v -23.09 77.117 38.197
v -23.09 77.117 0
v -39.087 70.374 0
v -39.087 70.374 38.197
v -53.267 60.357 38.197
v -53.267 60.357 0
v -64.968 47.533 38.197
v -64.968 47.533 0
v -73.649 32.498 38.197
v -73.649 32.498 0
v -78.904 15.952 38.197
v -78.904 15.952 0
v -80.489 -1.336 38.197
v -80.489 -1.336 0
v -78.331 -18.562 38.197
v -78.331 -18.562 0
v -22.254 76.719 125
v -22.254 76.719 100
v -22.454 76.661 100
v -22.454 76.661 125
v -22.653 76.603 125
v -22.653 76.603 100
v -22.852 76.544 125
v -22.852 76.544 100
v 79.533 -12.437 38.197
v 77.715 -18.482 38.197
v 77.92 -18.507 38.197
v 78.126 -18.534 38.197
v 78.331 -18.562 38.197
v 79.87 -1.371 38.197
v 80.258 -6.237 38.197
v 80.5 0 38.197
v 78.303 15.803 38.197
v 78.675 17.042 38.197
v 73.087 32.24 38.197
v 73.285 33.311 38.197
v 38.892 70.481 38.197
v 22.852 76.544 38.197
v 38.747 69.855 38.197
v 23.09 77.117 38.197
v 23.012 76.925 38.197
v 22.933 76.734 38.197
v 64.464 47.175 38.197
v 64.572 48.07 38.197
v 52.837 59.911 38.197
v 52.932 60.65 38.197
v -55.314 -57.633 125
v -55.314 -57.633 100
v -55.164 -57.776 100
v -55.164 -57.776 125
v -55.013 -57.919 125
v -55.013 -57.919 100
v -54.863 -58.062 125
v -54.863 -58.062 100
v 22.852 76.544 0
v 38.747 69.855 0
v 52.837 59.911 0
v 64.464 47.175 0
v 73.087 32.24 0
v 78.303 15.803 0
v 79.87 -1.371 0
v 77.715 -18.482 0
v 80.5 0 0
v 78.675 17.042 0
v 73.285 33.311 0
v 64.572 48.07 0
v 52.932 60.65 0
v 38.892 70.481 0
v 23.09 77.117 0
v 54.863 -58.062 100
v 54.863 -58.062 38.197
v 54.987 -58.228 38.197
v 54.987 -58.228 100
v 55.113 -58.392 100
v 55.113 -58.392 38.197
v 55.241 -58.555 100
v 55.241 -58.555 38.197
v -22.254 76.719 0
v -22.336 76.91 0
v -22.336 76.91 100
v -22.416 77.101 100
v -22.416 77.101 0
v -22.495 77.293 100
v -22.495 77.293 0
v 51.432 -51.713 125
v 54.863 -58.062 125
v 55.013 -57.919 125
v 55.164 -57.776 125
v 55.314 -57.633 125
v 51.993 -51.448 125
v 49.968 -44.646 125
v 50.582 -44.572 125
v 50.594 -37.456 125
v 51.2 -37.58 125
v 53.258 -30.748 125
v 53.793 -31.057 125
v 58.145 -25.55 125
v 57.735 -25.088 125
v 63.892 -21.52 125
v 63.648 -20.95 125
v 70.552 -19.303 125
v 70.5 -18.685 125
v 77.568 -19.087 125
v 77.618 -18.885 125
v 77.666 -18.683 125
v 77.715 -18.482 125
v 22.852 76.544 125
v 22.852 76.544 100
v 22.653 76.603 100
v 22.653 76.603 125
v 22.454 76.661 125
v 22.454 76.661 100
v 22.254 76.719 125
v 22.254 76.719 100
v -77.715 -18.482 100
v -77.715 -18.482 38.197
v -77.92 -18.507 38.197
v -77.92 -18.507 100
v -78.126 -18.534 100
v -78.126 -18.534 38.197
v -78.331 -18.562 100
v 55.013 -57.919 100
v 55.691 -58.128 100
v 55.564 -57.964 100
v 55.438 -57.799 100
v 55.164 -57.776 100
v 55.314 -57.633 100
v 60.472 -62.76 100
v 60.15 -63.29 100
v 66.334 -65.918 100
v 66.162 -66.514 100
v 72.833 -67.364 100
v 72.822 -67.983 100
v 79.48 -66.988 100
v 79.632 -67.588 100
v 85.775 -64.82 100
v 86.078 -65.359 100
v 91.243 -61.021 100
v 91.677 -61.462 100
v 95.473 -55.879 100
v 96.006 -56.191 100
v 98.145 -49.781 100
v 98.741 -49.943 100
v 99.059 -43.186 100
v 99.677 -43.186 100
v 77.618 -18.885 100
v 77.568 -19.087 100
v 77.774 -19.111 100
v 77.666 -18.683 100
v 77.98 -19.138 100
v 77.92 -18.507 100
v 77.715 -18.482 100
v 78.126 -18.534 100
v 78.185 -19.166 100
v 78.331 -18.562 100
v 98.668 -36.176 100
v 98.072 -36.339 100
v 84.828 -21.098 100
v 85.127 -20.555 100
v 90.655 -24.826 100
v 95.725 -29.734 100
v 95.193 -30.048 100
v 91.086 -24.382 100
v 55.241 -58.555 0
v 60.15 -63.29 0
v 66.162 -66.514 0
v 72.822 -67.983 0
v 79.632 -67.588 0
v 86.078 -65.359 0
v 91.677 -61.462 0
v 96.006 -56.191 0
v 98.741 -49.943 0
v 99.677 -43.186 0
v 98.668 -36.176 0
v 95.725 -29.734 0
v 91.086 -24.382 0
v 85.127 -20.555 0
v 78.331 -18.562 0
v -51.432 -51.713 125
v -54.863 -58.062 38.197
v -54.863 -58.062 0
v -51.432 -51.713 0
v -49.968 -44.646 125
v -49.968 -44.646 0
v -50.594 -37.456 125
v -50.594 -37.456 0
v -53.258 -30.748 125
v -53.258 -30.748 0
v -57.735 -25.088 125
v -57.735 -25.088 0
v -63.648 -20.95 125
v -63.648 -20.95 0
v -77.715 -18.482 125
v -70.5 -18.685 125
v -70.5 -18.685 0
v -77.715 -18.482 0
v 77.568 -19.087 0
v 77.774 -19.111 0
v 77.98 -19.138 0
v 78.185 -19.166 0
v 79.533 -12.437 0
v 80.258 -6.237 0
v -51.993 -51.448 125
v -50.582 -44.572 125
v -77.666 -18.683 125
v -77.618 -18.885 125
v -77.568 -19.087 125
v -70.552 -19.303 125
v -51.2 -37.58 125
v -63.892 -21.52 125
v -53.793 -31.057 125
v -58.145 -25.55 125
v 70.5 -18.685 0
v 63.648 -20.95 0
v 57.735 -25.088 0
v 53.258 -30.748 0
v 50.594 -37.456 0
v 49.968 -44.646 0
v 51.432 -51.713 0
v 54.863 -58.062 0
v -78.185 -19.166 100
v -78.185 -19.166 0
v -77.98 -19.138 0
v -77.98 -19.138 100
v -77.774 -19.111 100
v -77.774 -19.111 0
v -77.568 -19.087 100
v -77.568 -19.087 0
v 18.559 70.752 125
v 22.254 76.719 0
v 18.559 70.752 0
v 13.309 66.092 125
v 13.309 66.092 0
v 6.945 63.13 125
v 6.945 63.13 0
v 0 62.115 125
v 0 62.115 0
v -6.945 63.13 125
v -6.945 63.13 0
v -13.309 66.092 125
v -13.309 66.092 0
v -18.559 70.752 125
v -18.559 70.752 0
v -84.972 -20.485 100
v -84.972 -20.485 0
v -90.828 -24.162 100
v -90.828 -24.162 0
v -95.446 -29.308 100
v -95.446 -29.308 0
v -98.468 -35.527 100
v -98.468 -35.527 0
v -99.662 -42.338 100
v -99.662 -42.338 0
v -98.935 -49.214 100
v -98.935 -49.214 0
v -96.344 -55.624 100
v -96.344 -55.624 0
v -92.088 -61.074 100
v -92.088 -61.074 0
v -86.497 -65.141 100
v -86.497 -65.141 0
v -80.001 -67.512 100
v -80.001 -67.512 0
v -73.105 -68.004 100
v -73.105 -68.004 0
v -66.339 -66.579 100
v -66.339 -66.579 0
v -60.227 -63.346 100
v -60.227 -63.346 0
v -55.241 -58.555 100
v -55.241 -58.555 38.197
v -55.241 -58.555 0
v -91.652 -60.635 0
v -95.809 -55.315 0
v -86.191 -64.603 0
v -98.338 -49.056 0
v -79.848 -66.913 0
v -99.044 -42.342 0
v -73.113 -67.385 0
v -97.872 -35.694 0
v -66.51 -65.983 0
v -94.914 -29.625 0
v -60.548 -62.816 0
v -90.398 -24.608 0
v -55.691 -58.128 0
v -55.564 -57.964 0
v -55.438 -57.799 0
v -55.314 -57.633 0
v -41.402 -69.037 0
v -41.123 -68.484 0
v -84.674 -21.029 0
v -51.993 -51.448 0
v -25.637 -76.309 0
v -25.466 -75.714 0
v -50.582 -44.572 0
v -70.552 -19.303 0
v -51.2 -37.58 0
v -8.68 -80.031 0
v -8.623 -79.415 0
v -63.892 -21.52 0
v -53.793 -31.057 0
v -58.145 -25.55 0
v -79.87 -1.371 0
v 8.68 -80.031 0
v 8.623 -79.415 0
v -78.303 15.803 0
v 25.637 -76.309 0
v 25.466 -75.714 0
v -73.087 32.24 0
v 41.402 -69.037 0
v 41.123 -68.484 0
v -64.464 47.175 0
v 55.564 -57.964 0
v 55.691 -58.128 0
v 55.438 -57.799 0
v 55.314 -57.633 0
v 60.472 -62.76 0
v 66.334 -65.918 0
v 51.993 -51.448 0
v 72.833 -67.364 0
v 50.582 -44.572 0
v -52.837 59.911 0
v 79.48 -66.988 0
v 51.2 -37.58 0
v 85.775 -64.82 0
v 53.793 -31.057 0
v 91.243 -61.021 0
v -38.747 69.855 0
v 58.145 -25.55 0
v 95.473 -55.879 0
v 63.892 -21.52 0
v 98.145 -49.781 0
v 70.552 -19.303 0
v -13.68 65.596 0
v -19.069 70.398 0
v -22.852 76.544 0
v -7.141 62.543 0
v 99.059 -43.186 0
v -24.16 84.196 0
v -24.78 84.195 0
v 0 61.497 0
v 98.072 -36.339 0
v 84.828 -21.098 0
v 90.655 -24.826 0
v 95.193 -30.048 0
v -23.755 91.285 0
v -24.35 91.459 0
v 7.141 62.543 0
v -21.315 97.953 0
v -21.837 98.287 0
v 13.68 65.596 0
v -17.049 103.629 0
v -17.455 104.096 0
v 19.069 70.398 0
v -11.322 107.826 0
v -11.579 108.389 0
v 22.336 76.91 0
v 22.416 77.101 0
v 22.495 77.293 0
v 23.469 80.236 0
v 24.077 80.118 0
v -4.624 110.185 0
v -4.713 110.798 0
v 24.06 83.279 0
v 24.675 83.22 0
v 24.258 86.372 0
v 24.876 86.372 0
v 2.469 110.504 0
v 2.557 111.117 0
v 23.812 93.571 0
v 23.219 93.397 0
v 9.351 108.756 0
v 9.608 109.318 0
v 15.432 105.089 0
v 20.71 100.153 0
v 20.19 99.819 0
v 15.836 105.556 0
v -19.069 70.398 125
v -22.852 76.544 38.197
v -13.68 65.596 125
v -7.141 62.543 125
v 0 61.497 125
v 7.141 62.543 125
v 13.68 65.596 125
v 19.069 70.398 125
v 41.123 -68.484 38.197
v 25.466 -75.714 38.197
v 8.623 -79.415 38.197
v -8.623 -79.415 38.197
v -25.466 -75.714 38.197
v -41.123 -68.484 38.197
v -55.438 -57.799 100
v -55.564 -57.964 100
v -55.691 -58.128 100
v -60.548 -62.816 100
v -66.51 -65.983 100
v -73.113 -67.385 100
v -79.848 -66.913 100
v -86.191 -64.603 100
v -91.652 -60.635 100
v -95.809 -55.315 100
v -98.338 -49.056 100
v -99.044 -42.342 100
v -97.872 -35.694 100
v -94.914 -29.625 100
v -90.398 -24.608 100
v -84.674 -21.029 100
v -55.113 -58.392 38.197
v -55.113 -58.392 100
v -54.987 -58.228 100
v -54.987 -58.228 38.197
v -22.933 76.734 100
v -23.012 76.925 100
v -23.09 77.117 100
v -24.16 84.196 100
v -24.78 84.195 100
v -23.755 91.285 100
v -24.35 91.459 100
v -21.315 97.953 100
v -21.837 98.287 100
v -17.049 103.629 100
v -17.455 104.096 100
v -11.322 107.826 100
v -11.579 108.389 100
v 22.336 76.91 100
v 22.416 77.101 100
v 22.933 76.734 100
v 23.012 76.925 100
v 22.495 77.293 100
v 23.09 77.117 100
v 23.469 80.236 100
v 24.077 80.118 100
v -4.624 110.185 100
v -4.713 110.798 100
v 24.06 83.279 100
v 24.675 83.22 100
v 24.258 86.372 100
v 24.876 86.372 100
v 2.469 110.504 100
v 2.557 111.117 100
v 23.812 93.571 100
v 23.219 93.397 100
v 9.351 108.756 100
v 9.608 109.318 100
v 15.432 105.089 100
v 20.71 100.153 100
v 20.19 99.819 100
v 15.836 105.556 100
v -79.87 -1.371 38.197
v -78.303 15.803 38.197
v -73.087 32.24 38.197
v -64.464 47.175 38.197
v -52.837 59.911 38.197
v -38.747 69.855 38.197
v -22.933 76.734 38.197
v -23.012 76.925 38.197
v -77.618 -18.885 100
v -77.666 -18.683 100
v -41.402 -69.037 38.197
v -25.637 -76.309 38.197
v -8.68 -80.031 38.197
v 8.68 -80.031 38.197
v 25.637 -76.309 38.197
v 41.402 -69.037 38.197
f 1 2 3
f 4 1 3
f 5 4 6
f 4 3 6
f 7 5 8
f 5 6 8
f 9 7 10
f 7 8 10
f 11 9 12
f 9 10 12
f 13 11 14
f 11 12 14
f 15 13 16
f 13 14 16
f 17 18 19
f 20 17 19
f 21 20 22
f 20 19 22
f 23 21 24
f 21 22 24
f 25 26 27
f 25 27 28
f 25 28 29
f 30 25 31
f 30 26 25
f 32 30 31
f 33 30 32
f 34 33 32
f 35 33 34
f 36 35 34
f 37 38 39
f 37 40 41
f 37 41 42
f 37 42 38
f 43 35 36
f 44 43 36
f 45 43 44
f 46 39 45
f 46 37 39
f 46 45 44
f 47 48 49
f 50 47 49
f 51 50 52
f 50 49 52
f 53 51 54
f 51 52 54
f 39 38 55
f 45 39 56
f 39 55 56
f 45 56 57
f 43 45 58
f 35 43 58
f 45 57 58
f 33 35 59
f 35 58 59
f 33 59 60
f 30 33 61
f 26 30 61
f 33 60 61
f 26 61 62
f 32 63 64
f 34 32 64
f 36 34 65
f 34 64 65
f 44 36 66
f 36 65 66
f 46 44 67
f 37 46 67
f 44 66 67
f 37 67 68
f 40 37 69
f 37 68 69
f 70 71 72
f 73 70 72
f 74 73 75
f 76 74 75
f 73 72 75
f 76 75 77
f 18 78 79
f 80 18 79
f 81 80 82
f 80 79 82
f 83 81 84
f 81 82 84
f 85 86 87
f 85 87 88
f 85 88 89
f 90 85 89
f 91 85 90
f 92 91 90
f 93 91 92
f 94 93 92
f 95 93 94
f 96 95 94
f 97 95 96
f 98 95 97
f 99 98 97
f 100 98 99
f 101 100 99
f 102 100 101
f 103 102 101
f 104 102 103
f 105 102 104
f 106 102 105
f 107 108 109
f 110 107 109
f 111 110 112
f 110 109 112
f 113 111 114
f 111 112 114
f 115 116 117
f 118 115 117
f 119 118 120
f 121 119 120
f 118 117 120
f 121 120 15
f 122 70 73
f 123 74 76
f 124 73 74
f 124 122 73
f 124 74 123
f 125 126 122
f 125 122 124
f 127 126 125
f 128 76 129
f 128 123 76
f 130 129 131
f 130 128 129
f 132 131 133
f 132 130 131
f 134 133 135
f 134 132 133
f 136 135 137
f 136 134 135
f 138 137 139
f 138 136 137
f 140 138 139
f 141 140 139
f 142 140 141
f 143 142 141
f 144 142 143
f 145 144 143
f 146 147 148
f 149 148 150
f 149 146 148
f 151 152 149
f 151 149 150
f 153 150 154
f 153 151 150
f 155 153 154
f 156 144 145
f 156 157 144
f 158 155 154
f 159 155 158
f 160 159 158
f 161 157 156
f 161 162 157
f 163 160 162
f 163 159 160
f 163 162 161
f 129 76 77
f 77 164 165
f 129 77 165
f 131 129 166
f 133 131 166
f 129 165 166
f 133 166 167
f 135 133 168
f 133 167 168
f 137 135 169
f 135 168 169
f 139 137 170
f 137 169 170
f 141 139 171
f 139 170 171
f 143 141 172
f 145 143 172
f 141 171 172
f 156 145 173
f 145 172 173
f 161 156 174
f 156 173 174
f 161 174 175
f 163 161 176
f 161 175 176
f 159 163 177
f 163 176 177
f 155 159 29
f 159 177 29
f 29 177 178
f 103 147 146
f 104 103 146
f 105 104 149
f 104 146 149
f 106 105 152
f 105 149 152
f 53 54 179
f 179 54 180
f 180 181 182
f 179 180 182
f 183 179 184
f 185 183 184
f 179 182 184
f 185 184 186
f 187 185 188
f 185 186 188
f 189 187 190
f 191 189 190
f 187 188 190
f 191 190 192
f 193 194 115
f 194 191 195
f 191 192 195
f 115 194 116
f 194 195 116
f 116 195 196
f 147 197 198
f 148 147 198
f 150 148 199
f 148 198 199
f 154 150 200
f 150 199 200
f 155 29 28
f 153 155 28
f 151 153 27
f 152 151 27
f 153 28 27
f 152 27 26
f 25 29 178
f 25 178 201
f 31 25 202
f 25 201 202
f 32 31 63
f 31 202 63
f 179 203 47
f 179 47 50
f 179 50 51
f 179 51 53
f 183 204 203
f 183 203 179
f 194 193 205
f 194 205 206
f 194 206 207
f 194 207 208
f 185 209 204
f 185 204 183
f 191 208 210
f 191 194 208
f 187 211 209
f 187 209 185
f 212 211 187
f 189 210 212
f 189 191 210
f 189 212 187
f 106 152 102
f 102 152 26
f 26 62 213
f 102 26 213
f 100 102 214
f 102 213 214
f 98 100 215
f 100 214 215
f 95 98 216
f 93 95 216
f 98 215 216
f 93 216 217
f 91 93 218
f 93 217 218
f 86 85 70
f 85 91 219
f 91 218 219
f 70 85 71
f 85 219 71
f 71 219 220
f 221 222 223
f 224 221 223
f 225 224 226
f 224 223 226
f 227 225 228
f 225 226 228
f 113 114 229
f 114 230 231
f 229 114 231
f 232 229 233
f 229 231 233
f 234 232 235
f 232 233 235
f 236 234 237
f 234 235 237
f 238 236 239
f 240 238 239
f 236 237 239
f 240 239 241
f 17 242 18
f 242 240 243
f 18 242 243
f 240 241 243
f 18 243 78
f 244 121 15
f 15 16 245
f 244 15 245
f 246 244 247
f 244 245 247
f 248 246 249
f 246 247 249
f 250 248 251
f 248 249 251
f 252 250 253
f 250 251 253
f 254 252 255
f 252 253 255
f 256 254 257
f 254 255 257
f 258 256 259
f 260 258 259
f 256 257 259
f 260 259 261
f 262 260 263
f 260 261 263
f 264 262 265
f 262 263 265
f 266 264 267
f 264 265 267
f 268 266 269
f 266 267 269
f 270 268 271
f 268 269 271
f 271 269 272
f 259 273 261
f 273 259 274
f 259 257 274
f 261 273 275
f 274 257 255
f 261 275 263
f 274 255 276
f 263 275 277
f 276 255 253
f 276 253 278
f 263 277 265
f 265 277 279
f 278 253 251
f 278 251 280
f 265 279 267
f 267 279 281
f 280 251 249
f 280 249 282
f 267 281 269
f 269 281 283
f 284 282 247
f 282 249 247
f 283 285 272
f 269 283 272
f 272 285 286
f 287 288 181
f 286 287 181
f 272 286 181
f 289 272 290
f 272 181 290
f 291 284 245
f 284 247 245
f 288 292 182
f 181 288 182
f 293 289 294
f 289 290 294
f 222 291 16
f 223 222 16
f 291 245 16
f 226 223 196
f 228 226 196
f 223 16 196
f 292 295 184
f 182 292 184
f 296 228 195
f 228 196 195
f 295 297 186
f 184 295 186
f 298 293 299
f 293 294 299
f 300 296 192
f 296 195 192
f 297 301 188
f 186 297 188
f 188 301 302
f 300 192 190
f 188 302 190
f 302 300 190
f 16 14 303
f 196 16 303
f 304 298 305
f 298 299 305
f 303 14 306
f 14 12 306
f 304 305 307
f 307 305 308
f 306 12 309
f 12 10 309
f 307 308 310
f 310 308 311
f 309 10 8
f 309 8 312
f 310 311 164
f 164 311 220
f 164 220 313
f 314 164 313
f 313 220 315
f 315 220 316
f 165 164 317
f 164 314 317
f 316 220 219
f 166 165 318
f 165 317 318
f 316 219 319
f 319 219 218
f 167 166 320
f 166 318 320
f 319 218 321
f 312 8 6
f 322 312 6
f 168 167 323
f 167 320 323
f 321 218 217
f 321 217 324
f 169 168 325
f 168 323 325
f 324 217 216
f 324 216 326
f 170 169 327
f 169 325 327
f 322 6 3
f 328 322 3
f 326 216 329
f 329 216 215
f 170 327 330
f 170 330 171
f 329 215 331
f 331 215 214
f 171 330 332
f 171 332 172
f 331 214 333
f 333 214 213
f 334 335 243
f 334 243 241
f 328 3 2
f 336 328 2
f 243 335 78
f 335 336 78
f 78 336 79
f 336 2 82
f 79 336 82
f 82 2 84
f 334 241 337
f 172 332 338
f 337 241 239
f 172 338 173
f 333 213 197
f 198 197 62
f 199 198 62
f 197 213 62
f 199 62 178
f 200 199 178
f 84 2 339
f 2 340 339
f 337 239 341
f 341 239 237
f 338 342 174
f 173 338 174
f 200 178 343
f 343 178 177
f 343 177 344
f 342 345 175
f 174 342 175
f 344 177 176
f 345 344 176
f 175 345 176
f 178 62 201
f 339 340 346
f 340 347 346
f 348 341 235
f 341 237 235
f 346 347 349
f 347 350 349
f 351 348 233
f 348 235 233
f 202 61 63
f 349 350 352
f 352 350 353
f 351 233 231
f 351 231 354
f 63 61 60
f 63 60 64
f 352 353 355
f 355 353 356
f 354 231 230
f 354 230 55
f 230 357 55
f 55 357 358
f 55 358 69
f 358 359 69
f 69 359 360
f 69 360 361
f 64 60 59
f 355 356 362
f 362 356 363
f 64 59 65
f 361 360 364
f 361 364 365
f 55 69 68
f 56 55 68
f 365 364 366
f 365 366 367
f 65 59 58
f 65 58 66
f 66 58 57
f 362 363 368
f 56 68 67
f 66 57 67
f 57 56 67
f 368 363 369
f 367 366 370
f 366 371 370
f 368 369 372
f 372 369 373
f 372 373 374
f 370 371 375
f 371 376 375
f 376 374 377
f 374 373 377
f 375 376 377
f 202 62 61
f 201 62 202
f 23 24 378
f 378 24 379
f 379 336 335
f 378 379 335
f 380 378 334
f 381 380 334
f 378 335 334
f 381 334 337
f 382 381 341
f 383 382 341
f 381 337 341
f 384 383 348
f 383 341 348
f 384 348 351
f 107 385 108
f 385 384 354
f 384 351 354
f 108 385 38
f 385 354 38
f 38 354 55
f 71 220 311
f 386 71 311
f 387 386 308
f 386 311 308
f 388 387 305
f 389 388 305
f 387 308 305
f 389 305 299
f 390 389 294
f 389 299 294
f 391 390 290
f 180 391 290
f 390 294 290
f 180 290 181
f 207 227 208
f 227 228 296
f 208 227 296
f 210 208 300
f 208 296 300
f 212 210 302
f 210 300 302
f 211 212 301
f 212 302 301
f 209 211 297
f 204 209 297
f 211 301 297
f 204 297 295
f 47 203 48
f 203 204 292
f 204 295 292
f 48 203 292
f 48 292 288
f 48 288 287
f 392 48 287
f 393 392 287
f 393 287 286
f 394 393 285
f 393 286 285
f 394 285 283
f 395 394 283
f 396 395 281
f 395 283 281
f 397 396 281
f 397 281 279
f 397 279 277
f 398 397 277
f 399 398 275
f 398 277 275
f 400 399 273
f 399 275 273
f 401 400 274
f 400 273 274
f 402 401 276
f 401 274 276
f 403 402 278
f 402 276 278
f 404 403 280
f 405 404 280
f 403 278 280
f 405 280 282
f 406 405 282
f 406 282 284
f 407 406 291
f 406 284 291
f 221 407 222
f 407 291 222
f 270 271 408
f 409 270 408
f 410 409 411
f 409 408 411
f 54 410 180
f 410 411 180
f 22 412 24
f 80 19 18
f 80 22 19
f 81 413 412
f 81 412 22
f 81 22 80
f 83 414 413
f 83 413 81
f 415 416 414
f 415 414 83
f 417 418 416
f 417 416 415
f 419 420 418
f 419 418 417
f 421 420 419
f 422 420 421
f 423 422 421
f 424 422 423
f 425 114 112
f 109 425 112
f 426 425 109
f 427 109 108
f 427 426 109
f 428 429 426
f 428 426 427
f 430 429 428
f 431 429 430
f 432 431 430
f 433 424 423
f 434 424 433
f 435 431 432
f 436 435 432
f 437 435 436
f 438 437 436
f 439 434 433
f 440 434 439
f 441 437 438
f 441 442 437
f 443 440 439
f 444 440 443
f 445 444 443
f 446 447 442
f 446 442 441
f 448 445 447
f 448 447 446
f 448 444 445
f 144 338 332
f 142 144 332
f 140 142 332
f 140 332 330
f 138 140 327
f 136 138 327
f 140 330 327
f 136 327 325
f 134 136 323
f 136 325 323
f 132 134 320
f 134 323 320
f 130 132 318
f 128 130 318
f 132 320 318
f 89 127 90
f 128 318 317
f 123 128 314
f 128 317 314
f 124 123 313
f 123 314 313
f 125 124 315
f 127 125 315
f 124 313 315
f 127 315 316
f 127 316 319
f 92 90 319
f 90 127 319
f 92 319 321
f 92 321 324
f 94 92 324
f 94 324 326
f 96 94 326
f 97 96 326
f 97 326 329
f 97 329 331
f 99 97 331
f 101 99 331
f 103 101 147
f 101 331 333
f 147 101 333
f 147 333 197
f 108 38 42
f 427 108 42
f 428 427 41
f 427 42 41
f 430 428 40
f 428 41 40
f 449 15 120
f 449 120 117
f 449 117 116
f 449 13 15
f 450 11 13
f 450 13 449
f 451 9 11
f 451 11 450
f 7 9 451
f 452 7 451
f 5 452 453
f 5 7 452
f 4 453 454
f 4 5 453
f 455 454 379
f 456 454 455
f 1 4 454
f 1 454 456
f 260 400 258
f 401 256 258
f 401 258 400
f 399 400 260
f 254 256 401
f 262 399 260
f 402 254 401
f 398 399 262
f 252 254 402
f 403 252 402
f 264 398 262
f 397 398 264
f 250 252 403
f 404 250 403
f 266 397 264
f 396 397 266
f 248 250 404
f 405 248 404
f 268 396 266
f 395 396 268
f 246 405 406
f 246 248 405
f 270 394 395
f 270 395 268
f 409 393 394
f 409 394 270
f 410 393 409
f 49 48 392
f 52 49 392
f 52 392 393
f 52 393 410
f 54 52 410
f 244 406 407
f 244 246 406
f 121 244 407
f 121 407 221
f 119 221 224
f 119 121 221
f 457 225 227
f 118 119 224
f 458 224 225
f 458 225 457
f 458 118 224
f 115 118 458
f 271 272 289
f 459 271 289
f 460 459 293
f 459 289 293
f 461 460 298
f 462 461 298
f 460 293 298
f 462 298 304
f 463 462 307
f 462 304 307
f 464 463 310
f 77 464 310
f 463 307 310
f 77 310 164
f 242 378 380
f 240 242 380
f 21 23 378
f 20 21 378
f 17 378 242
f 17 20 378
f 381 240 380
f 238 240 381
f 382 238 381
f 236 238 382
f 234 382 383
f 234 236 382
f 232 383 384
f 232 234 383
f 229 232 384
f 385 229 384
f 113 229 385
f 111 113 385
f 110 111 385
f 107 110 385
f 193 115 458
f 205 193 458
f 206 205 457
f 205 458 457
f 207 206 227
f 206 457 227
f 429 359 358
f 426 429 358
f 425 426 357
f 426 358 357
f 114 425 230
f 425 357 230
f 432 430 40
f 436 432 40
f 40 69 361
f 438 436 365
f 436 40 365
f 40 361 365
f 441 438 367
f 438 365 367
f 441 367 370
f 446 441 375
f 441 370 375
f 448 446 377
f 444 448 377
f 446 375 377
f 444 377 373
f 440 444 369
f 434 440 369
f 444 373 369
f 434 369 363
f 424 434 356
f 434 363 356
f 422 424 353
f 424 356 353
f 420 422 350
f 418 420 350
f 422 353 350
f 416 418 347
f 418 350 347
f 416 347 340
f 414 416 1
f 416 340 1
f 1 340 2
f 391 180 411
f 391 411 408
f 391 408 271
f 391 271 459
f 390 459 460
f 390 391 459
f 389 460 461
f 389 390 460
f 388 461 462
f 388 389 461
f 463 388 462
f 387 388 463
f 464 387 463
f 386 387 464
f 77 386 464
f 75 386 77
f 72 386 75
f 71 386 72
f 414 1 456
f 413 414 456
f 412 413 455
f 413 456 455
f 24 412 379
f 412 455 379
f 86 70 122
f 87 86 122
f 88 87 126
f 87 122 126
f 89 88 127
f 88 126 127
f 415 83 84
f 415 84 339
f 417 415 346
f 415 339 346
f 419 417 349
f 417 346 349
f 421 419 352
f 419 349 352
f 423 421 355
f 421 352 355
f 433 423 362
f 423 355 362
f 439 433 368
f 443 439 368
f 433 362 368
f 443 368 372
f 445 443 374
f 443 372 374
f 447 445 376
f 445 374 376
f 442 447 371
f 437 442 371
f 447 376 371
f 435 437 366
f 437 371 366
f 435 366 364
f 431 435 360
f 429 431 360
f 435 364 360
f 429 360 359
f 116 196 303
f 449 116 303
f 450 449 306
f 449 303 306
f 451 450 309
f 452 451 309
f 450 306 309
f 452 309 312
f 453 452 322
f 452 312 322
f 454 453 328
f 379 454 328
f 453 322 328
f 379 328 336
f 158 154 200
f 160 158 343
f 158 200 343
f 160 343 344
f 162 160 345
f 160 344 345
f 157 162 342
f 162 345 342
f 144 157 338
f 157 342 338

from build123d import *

# Parameters (mm, degrees)
F5_DEPTH = 38.196601125
F6_DEPTH = 100
F8_DEPTH = 25


with BuildPart() as f5:
    # F4 (on Top) → F5 (new body)
    with BuildSketch(Plane.XY):
        with BuildLine():
            ThreePointArc((55.2405756929, -58.5553481513), (55.4659681323, -58.3418921457), (55.6905357594, -58.1275685611))
            ThreePointArc((55.6905357594, -58.1275685611), (55.5005343284, -57.8813176256), (55.3137058467, -57.6326508095))
            ThreePointArc((55.3137058467, -57.6326508095), (55.0886829293, -57.8477787555), (54.8628233356, -58.0620281206))
            ThreePointArc((54.8628233356, -58.0620281206), (55.0501592129, -58.3098675984), (55.2405756929, -58.5553481513))
        make_face()
        with BuildLine():
            ThreePointArc((-55.2405756929, -58.5553481513), (0, -80.5), (55.2405756929, -58.5553481513))
            ThreePointArc((55.2405756929, -58.5553481513), (55.0501592129, -58.3098675984), (54.8628233356, -58.0620281206))
            ThreePointArc((54.8628233356, -58.0620281206), (0, -79.8819660113), (-54.8628233356, -58.0620281206))
            ThreePointArc((-54.8628233356, -58.0620281206), (-55.0501592129, -58.3098675984), (-55.2405756929, -58.5553481513))
        make_face()
        with BuildLine():
            ThreePointArc((-55.6905357594, -58.1275685611), (-55.4659681323, -58.3418921457), (-55.2405756929, -58.5553481513))
            ThreePointArc((-55.2405756929, -58.5553481513), (-55.0501592129, -58.3098675984), (-54.8628233356, -58.0620281206))
            ThreePointArc((-54.8628233356, -58.0620281206), (-55.0886829293, -57.8477787555), (-55.3137058467, -57.6326508095))
            ThreePointArc((-55.3137058467, -57.6326508095), (-55.5005343284, -57.8813176256), (-55.6905357594, -58.1275685611))
        make_face()
        with BuildLine():
            ThreePointArc((-77.7146030154, -18.4815846716), (-69.17981187, 39.9409830056), (-22.8517796799, 76.5436127922))
            ThreePointArc((-22.8517796799, 76.5436127922), (-22.9727470251, 76.8297701599), (-23.09013118, 77.1174159454))
            ThreePointArc((-23.09013118, 77.1174159454), (-69.7150450046, 40.25), (-78.3307068729, -18.5620677941))
            ThreePointArc((-78.3307068729, -18.5620677941), (-78.022906238, -18.5199025615), (-77.7146030154, -18.4815846716))
        make_face()
        with BuildLine():
            ThreePointArc((-77.5681926118, -19.0867490359), (-77.6419874194, -18.7843095), (-77.7146030154, -18.4815846716))
            ThreePointArc((-77.7146030154, -18.4815846716), (-78.022906238, -18.5199025615), (-78.3307068729, -18.5620677941))
            ThreePointArc((-78.3307068729, -18.5620677941), (-78.2585447692, -18.8639913752), (-78.1852189139, -19.1656344374))
            ThreePointArc((-78.1852189139, -19.1656344374), (-77.8769586325, -19.1242138392), (-77.5681926118, -19.0867490359))
        make_face()
        with BuildLine():
            ThreePointArc((-22.2544867651, 76.7193998454), (-22.3764243041, 77.0055314648), (-22.4946831545, 77.2932029986))
            ThreePointArc((-22.4946831545, 77.2932029986), (-22.7925766369, 77.205883521), (-23.09013118, 77.1174159454))
            ThreePointArc((-23.09013118, 77.1174159454), (-22.9727470251, 76.8297701599), (-22.8517796799, 76.5436127922))
            ThreePointArc((-22.8517796799, 76.5436127922), (-22.5533044901, 76.6320882555), (-22.2544867651, 76.7193998454))
        make_face()
        with BuildLine():
            ThreePointArc((22.8517796799, 76.5436127922), (22.9727470251, 76.8297701599), (23.09013118, 77.1174159454))
            ThreePointArc((23.09013118, 77.1174159454), (22.7925766369, 77.205883521), (22.4946831545, 77.2932029986))
            ThreePointArc((22.4946831545, 77.2932029986), (22.3764243041, 77.0055314648), (22.2544867651, 76.7193998454))
            ThreePointArc((22.2544867651, 76.7193998454), (22.5533044901, 76.6320882555), (22.8517796799, 76.5436127922))
        make_face()
        with BuildLine():
            ThreePointArc((78.3307068729, -18.5620677941), (79.9558375082, -9.3441986476), (80.5, 0))
            ThreePointArc((80.5, 0), (64.5716871391, 48.0702321609), (23.09013118, 77.1174159454))
            ThreePointArc((23.09013118, 77.1174159454), (22.9727470251, 76.8297701599), (22.8517796799, 76.5436127922))
            ThreePointArc((22.8517796799, 76.5436127922), (64.0569027565, 47.7267399166), (79.8819660113, 0))
            ThreePointArc((79.8819660113, 0), (79.3382750332, -9.3041178294), (77.7146030154, -18.4815846716))
            ThreePointArc((77.7146030154, -18.4815846716), (78.022906238, -18.5199025615), (78.3307068729, -18.5620677941))
        make_face()
        with BuildLine():
            ThreePointArc((78.1852189139, -19.1656344374), (78.2585447692, -18.8639913752), (78.3307068729, -18.5620677941))
            ThreePointArc((78.3307068729, -18.5620677941), (78.022906238, -18.5199025615), (77.7146030154, -18.4815846716))
            ThreePointArc((77.7146030154, -18.4815846716), (77.6419874194, -18.7843095), (77.5681926118, -19.0867490359))
            ThreePointArc((77.5681926118, -19.0867490359), (77.8769586325, -19.1242138392), (78.1852189139, -19.1656344374))
        make_face()
        with BuildLine():
            ThreePointArc((99.6765570463, -43.1861979292), (93.5972454648, -26.8920800907), (78.3307068729, -18.5620677941))
            ThreePointArc((78.3307068729, -18.5620677941), (78.2585447692, -18.8639913752), (78.1852189139, -19.1656344374))
            ThreePointArc((78.1852189139, -19.1656344374), (93.1111215206, -27.2748631617), (99.0585230576, -43.1861979292))
            ThreePointArc((99.0585230576, -43.1861979292), (82.7023213332, -66.1210343067), (55.6905357594, -58.1275685611))
            ThreePointArc((55.6905357594, -58.1275685611), (55.4659681323, -58.3418921457), (55.2405756929, -58.5553481513))
            ThreePointArc((55.2405756929, -58.5553481513), (82.9319254828, -66.6955961424), (99.6765570463, -43.1861979292))
        make_face()
        with BuildLine():
            ThreePointArc((77.5681926118, -19.0867490359), (77.6419874194, -18.7843095), (77.7146030154, -18.4815846716))
            ThreePointArc((77.7146030154, -18.4815846716), (53.2575553291, -30.7482639056), (54.8628233356, -58.0620281206))
            ThreePointArc((54.8628233356, -58.0620281206), (55.0886829293, -57.8477787555), (55.3137058467, -57.6326508095))
            ThreePointArc((55.3137058467, -57.6326508095), (53.7927884638, -31.0572809), (77.5681926118, -19.0867490359))
        make_face()
        with BuildLine():
            ThreePointArc((-22.8517796799, 76.5436127922), (0, 61.4965278113), (22.8517796799, 76.5436127922))
            ThreePointArc((22.8517796799, 76.5436127922), (22.5533044901, 76.6320882555), (22.2544867651, 76.7193998454))
            ThreePointArc((22.2544867651, 76.7193998454), (0, 62.1145618), (-22.2544867651, 76.7193998454))
            ThreePointArc((-22.2544867651, 76.7193998454), (-22.5533044901, 76.6320882555), (-22.8517796799, 76.5436127922))
        make_face()
        with BuildLine():
            ThreePointArc((22.4946831545, 77.2932029986), (22.7925766369, 77.205883521), (23.09013118, 77.1174159454))
            ThreePointArc((23.09013118, 77.1174159454), (24.4253543222, 81.6595541109), (24.8758680472, 86.3723958584))
            ThreePointArc((24.8758680472, 86.3723958584), (-4.7128417476, 110.7977501806), (-23.09013118, 77.1174159454))
            ThreePointArc((-23.09013118, 77.1174159454), (-22.7925766369, 77.205883521), (-22.4946831545, 77.2932029986))
            ThreePointArc((-22.4946831545, 77.2932029986), (-4.6244038561, 110.1853629601), (24.2578340584, 86.3723958584))
            ThreePointArc((24.2578340584, 86.3723958584), (23.8129671016, 81.7479920024), (22.4946831545, 77.2932029986))
        make_face()
        with BuildLine():
            ThreePointArc((-78.1852189139, -19.1656344374), (-78.2585447692, -18.8639913752), (-78.3307068729, -18.5620677941))
            ThreePointArc((-78.3307068729, -18.5620677941), (-96.3438226692, -55.6241319528), (-55.2405756929, -58.5553481513))
            ThreePointArc((-55.2405756929, -58.5553481513), (-55.4659681323, -58.3418921457), (-55.6905357594, -58.1275685611))
            ThreePointArc((-55.6905357594, -58.1275685611), (-95.8085895345, -55.3151149584), (-78.1852189139, -19.1656344374))
        make_face()
        with BuildLine():
            ThreePointArc((-49.924820952, -43.1861979292), (-58.2730958512, -24.5946010146), (-77.7146030154, -18.4815846716))
            ThreePointArc((-77.7146030154, -18.4815846716), (-77.6419874194, -18.7843095), (-77.5681926118, -19.0867490359))
            ThreePointArc((-77.5681926118, -19.0867490359), (-58.6558930913, -25.0812793075), (-50.5428549407, -43.1861979292))
            ThreePointArc((-50.5428549407, -43.1861979292), (-51.7664262931, -50.7931194351), (-55.3137058467, -57.6326508095))
            ThreePointArc((-55.3137058467, -57.6326508095), (-55.0886829293, -57.8477787555), (-54.8628233356, -58.0620281206))
            ThreePointArc((-54.8628233356, -58.0620281206), (-51.1915750123, -51.0231965802), (-49.924820952, -43.1861979292))
        make_face()
    extrude(amount=F5_DEPTH)

    # F4 (on Top) → F6 (join)
    with BuildSketch(Plane.XY):
        with BuildLine():
            ThreePointArc((-49.924820952, -43.1861979292), (-58.2730958512, -24.5946010146), (-77.7146030154, -18.4815846716))
            ThreePointArc((-77.7146030154, -18.4815846716), (-77.6419874194, -18.7843095), (-77.5681926118, -19.0867490359))
            ThreePointArc((-77.5681926118, -19.0867490359), (-58.6558930913, -25.0812793075), (-50.5428549407, -43.1861979292))
            ThreePointArc((-50.5428549407, -43.1861979292), (-51.7664262931, -50.7931194351), (-55.3137058467, -57.6326508095))
            ThreePointArc((-55.3137058467, -57.6326508095), (-55.0886829293, -57.8477787555), (-54.8628233356, -58.0620281206))
            ThreePointArc((-54.8628233356, -58.0620281206), (-51.1915750123, -51.0231965802), (-49.924820952, -43.1861979292))
        make_face()
        with BuildLine():
            ThreePointArc((77.5681926118, -19.0867490359), (77.6419874194, -18.7843095), (77.7146030154, -18.4815846716))
            ThreePointArc((77.7146030154, -18.4815846716), (53.2575553291, -30.7482639056), (54.8628233356, -58.0620281206))
            ThreePointArc((54.8628233356, -58.0620281206), (55.0886829293, -57.8477787555), (55.3137058467, -57.6326508095))
            ThreePointArc((55.3137058467, -57.6326508095), (53.7927884638, -31.0572809), (77.5681926118, -19.0867490359))
        make_face()
        with BuildLine():
            ThreePointArc((55.2405756929, -58.5553481513), (55.4659681323, -58.3418921457), (55.6905357594, -58.1275685611))
            ThreePointArc((55.6905357594, -58.1275685611), (55.5005343284, -57.8813176256), (55.3137058467, -57.6326508095))
            ThreePointArc((55.3137058467, -57.6326508095), (55.0886829293, -57.8477787555), (54.8628233356, -58.0620281206))
            ThreePointArc((54.8628233356, -58.0620281206), (55.0501592129, -58.3098675984), (55.2405756929, -58.5553481513))
        make_face()
        with BuildLine():
            ThreePointArc((78.1852189139, -19.1656344374), (78.2585447692, -18.8639913752), (78.3307068729, -18.5620677941))
            ThreePointArc((78.3307068729, -18.5620677941), (78.022906238, -18.5199025615), (77.7146030154, -18.4815846716))
            ThreePointArc((77.7146030154, -18.4815846716), (77.6419874194, -18.7843095), (77.5681926118, -19.0867490359))
            ThreePointArc((77.5681926118, -19.0867490359), (77.8769586325, -19.1242138392), (78.1852189139, -19.1656344374))
        make_face()
        with BuildLine():
            ThreePointArc((-77.5681926118, -19.0867490359), (-77.6419874194, -18.7843095), (-77.7146030154, -18.4815846716))
            ThreePointArc((-77.7146030154, -18.4815846716), (-78.022906238, -18.5199025615), (-78.3307068729, -18.5620677941))
            ThreePointArc((-78.3307068729, -18.5620677941), (-78.2585447692, -18.8639913752), (-78.1852189139, -19.1656344374))
            ThreePointArc((-78.1852189139, -19.1656344374), (-77.8769586325, -19.1242138392), (-77.5681926118, -19.0867490359))
        make_face()
        with BuildLine():
            ThreePointArc((-55.6905357594, -58.1275685611), (-55.4659681323, -58.3418921457), (-55.2405756929, -58.5553481513))
            ThreePointArc((-55.2405756929, -58.5553481513), (-55.0501592129, -58.3098675984), (-54.8628233356, -58.0620281206))
            ThreePointArc((-54.8628233356, -58.0620281206), (-55.0886829293, -57.8477787555), (-55.3137058467, -57.6326508095))
            ThreePointArc((-55.3137058467, -57.6326508095), (-55.5005343284, -57.8813176256), (-55.6905357594, -58.1275685611))
        make_face()
        with BuildLine():
            ThreePointArc((-22.2544867651, 76.7193998454), (-22.3764243041, 77.0055314648), (-22.4946831545, 77.2932029986))
            ThreePointArc((-22.4946831545, 77.2932029986), (-22.7925766369, 77.205883521), (-23.09013118, 77.1174159454))
            ThreePointArc((-23.09013118, 77.1174159454), (-22.9727470251, 76.8297701599), (-22.8517796799, 76.5436127922))
            ThreePointArc((-22.8517796799, 76.5436127922), (-22.5533044901, 76.6320882555), (-22.2544867651, 76.7193998454))
        make_face()
        with BuildLine():
            ThreePointArc((-22.8517796799, 76.5436127922), (0, 61.4965278113), (22.8517796799, 76.5436127922))
            ThreePointArc((22.8517796799, 76.5436127922), (22.5533044901, 76.6320882555), (22.2544867651, 76.7193998454))
            ThreePointArc((22.2544867651, 76.7193998454), (0, 62.1145618), (-22.2544867651, 76.7193998454))
            ThreePointArc((-22.2544867651, 76.7193998454), (-22.5533044901, 76.6320882555), (-22.8517796799, 76.5436127922))
        make_face()
        with BuildLine():
            ThreePointArc((22.8517796799, 76.5436127922), (22.9727470251, 76.8297701599), (23.09013118, 77.1174159454))
            ThreePointArc((23.09013118, 77.1174159454), (22.7925766369, 77.205883521), (22.4946831545, 77.2932029986))
            ThreePointArc((22.4946831545, 77.2932029986), (22.3764243041, 77.0055314648), (22.2544867651, 76.7193998454))
            ThreePointArc((22.2544867651, 76.7193998454), (22.5533044901, 76.6320882555), (22.8517796799, 76.5436127922))
        make_face()
        with BuildLine():
            ThreePointArc((22.4946831545, 77.2932029986), (22.7925766369, 77.205883521), (23.09013118, 77.1174159454))
            ThreePointArc((23.09013118, 77.1174159454), (24.4253543222, 81.6595541109), (24.8758680472, 86.3723958584))
            ThreePointArc((24.8758680472, 86.3723958584), (-4.7128417476, 110.7977501806), (-23.09013118, 77.1174159454))
            ThreePointArc((-23.09013118, 77.1174159454), (-22.7925766369, 77.205883521), (-22.4946831545, 77.2932029986))
            ThreePointArc((-22.4946831545, 77.2932029986), (-4.6244038561, 110.1853629601), (24.2578340584, 86.3723958584))
            ThreePointArc((24.2578340584, 86.3723958584), (23.8129671016, 81.7479920024), (22.4946831545, 77.2932029986))
        make_face()
        with BuildLine():
            ThreePointArc((-78.1852189139, -19.1656344374), (-78.2585447692, -18.8639913752), (-78.3307068729, -18.5620677941))
            ThreePointArc((-78.3307068729, -18.5620677941), (-96.3438226692, -55.6241319528), (-55.2405756929, -58.5553481513))
            ThreePointArc((-55.2405756929, -58.5553481513), (-55.4659681323, -58.3418921457), (-55.6905357594, -58.1275685611))
            ThreePointArc((-55.6905357594, -58.1275685611), (-95.8085895345, -55.3151149584), (-78.1852189139, -19.1656344374))
        make_face()
        with BuildLine():
            ThreePointArc((99.6765570463, -43.1861979292), (93.5972454648, -26.8920800907), (78.3307068729, -18.5620677941))
            ThreePointArc((78.3307068729, -18.5620677941), (78.2585447692, -18.8639913752), (78.1852189139, -19.1656344374))
            ThreePointArc((78.1852189139, -19.1656344374), (93.1111215206, -27.2748631617), (99.0585230576, -43.1861979292))
            ThreePointArc((99.0585230576, -43.1861979292), (82.7023213332, -66.1210343067), (55.6905357594, -58.1275685611))
            ThreePointArc((55.6905357594, -58.1275685611), (55.4659681323, -58.3418921457), (55.2405756929, -58.5553481513))
            ThreePointArc((55.2405756929, -58.5553481513), (82.9319254828, -66.6955961424), (99.6765570463, -43.1861979292))
        make_face()
    extrude(amount=F6_DEPTH)

    # F7 (on face) → F8 (join)
    with BuildSketch(Plane.XY.offset(100)):
        with BuildLine():
            ThreePointArc((-49.924820952, -43.1861979292), (-58.2730958512, -24.5946010146), (-77.7146030154, -18.4815846716))
            ThreePointArc((-77.7146030154, -18.4815846716), (-77.6419874194, -18.7843095), (-77.5681926118, -19.0867490359))
            ThreePointArc((-77.5681926118, -19.0867490359), (-58.6558930913, -25.0812793075), (-50.5428549407, -43.1861979292))
            ThreePointArc((-50.5428549407, -43.1861979292), (-51.7664262931, -50.7931194351), (-55.3137058467, -57.6326508095))
            ThreePointArc((-55.3137058467, -57.6326508095), (-55.0886829293, -57.8477787555), (-54.8628233356, -58.0620281206))
            ThreePointArc((-54.8628233356, -58.0620281206), (-51.1915750123, -51.0231965802), (-49.924820952, -43.1861979292))
        make_face()
        with BuildLine():
            ThreePointArc((-22.2544867651, 76.7193998454), (-22.5533044901, 76.6320882555), (-22.8517796799, 76.5436127922))
            ThreePointArc((-22.8517796799, 76.5436127922), (0, 61.4965278113), (22.8517796799, 76.5436127922))
            ThreePointArc((22.8517796799, 76.5436127922), (22.5533044901, 76.6320882555), (22.2544867651, 76.7193998454))
            ThreePointArc((22.2544867651, 76.7193998454), (0, 62.1145618), (-22.2544867651, 76.7193998454))
        make_face()
        with BuildLine():
            ThreePointArc((77.5681926118, -19.0867490359), (77.6419874194, -18.7843095), (77.7146030154, -18.4815846716))
            ThreePointArc((77.7146030154, -18.4815846716), (53.2575553291, -30.7482639056), (54.8628233356, -58.0620281206))
            ThreePointArc((54.8628233356, -58.0620281206), (55.0886829293, -57.8477787555), (55.3137058467, -57.6326508095))
            ThreePointArc((55.3137058467, -57.6326508095), (53.7927884638, -31.0572809), (77.5681926118, -19.0867490359))
        make_face()
    extrude(amount=F8_DEPTH)


solid = f5.part
